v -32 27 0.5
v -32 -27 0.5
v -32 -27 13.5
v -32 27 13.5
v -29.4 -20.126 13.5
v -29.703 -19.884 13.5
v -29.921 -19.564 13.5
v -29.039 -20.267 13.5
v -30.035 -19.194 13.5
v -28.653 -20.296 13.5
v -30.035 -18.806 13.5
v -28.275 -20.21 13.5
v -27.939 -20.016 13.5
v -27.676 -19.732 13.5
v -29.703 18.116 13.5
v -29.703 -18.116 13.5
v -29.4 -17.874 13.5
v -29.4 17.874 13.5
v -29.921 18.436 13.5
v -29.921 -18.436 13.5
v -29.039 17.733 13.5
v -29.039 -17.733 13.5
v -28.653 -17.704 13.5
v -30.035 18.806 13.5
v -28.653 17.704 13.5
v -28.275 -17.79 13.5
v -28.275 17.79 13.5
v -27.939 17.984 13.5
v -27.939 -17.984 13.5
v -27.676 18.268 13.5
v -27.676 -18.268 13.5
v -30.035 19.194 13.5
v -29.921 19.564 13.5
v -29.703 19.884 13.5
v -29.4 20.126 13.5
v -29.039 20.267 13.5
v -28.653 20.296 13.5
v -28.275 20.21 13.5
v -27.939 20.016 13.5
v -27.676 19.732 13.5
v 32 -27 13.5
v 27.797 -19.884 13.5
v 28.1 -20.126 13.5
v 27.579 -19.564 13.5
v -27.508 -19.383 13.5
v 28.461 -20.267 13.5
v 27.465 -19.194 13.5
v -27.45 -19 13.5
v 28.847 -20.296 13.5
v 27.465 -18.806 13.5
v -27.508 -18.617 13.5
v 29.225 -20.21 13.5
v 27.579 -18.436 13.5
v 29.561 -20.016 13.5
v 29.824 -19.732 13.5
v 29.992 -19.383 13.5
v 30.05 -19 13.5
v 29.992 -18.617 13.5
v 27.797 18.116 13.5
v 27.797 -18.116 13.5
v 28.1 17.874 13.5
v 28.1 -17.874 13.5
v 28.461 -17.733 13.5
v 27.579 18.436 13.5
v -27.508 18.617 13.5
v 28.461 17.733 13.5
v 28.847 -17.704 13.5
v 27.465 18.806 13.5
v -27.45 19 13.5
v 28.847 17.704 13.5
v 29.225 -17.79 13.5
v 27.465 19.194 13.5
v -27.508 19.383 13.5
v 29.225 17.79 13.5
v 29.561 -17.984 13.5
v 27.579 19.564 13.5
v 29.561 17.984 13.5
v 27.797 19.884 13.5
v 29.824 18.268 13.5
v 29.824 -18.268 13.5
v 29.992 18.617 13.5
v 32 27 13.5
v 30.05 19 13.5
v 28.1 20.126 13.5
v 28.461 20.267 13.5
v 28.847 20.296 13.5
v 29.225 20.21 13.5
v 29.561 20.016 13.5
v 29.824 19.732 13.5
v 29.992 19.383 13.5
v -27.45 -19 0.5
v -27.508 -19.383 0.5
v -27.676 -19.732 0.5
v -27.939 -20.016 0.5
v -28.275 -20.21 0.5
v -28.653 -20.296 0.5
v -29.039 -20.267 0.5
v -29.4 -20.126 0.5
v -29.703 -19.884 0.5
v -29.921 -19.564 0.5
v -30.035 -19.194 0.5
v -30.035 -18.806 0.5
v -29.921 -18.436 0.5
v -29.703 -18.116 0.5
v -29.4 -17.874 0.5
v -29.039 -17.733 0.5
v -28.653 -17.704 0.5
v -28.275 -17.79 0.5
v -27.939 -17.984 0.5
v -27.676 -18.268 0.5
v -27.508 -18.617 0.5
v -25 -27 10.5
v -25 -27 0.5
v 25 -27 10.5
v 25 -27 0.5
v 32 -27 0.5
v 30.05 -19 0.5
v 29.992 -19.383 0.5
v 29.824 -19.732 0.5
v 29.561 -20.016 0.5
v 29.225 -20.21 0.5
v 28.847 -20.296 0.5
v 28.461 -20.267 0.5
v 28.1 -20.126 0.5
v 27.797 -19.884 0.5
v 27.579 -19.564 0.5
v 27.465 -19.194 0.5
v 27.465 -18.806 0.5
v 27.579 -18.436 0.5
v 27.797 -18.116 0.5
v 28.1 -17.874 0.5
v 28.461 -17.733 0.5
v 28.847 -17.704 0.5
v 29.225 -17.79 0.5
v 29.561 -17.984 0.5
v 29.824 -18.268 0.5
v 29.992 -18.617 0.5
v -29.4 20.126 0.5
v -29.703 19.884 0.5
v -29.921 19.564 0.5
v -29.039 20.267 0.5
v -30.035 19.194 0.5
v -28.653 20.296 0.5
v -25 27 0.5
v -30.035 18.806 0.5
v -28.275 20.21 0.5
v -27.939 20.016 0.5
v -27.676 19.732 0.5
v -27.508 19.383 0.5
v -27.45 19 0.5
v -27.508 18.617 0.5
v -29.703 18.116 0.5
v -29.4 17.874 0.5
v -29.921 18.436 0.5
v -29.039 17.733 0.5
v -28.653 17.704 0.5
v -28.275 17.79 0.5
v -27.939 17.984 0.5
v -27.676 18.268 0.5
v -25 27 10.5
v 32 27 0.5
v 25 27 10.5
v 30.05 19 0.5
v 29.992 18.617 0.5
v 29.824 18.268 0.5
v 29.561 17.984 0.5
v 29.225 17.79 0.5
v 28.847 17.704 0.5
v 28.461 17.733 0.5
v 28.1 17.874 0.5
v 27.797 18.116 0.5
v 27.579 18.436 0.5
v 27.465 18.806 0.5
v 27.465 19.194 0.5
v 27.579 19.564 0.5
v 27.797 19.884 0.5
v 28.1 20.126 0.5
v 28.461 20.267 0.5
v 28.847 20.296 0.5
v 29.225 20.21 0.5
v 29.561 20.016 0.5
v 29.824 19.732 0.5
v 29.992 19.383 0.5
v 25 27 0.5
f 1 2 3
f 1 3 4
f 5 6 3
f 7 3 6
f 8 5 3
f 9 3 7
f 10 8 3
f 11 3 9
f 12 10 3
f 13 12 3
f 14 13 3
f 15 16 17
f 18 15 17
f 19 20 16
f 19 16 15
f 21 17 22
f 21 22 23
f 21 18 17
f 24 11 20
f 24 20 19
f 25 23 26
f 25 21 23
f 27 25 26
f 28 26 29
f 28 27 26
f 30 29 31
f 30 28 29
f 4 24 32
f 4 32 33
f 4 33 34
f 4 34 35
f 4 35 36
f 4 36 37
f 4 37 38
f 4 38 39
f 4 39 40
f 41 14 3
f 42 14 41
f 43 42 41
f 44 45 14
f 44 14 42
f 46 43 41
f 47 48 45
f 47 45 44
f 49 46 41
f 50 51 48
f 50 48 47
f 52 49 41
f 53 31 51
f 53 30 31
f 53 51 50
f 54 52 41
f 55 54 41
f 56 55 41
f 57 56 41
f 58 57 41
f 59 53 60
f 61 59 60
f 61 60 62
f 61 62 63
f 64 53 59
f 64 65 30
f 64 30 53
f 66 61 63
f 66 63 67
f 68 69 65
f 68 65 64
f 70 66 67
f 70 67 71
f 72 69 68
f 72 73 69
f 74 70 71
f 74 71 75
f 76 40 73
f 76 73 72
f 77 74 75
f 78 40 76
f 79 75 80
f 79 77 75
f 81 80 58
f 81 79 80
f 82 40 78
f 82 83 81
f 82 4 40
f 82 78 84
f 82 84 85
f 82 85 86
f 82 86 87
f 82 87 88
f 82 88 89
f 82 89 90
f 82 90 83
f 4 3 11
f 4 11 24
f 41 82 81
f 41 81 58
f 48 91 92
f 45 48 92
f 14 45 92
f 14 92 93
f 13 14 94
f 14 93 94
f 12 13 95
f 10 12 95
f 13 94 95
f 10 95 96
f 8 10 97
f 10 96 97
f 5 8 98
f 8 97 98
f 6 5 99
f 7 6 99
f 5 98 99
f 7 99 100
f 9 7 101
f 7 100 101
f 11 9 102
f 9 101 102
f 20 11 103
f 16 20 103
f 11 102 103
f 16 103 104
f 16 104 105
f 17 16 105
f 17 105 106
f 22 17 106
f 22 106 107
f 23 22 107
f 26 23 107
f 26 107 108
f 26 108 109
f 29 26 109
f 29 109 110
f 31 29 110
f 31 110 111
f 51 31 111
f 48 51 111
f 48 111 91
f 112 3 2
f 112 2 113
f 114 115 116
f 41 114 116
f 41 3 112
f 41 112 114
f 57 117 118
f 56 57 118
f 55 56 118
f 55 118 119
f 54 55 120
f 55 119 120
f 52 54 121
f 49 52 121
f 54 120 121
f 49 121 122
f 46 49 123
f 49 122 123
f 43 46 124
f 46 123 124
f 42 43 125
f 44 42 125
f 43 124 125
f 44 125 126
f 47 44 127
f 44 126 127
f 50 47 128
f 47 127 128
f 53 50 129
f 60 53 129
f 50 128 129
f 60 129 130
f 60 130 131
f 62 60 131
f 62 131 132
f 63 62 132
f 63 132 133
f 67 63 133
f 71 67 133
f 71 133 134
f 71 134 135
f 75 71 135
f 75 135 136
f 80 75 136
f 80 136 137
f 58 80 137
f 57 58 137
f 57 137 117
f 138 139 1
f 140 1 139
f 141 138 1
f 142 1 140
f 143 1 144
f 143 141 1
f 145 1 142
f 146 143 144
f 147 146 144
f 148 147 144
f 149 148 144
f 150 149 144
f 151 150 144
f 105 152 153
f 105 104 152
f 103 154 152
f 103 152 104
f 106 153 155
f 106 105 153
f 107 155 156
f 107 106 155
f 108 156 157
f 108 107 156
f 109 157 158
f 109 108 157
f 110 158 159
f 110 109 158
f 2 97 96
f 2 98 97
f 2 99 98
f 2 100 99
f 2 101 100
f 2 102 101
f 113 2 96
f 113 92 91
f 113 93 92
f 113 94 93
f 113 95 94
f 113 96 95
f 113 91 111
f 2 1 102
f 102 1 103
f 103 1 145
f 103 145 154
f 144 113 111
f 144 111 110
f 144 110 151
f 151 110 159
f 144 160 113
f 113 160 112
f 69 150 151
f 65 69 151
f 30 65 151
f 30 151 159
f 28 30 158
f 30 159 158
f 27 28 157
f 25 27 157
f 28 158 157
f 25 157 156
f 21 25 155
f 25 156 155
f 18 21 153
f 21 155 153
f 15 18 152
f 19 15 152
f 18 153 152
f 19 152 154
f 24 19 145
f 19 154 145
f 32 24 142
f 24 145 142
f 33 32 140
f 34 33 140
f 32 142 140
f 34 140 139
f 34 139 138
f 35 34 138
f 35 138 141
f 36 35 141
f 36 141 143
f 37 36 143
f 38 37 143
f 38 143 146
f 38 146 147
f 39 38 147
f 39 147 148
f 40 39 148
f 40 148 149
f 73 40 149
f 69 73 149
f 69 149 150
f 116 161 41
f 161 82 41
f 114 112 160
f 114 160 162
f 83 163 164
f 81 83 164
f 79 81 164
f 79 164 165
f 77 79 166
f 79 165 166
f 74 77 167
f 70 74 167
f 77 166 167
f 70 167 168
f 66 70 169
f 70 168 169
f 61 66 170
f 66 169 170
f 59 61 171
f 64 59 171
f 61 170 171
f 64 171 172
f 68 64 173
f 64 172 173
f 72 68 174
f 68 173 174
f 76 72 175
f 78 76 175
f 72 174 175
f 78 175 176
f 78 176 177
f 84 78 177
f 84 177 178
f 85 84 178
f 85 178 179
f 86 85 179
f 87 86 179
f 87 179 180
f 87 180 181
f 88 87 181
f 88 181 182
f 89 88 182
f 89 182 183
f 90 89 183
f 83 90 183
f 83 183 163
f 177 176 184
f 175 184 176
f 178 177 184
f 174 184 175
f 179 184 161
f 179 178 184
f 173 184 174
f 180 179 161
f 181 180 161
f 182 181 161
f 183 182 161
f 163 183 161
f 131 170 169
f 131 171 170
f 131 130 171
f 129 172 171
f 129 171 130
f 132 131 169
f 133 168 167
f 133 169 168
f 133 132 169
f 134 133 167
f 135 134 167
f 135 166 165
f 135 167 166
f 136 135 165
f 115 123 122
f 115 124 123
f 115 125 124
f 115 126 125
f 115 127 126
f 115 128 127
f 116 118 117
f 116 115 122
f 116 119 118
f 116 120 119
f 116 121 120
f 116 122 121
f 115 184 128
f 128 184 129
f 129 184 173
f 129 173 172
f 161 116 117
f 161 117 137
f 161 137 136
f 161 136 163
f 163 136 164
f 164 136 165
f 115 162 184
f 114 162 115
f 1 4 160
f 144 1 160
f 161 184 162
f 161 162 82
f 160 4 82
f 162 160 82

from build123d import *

# Parameters (mm, degrees)
SKETCH_W        = 64
SKETCH_H        = 54
PAD_DEPTH       = 3
SKETCH001_W     = 7
SKETCH001_H     = 54
PAD001_DEPTH    = 10
SKETCH002_R     = 1.3
POCKET_DEPTH    = 20
SKETCH003_R     = 1.3
POCKET001_DEPTH = 20


with BuildPart() as part:
    # Sketch → Pad (new body)
    with BuildSketch(Plane.XY):
        Rectangle(SKETCH_W, SKETCH_H)
    extrude(amount=PAD_DEPTH)

    # Sketch001 (on Face5 of Pad) → Pad001 (join)
    with BuildSketch(Plane(origin=(0, 0, 0), x_dir=(1, 0, 0), z_dir=(0, 0, -1))):
        with Locations((28.5, 0)):
            Rectangle(SKETCH001_W, SKETCH001_H)
        with Locations((-28.5, 0)):
            Rectangle(SKETCH001_W, SKETCH001_H)
    extrude(amount=PAD001_DEPTH)

    # Sketch002 (on Face12 of Pad001) → Pocket (cut)
    with BuildSketch(Plane(origin=(0, 0, -10), x_dir=(1, 0, 0), z_dir=(0, 0, -1))):
        with Locations((-28.75, 19)):
            Circle(SKETCH002_R)
        with Locations((-28.75, -19)):
            Circle(SKETCH002_R)
    extrude(amount=-POCKET_DEPTH, mode=Mode.SUBTRACT)

    # Sketch003 (on Face14 of Pocket) → Pocket001 (cut)
    with BuildSketch(Plane(origin=(0, 0, -10), x_dir=(1, 0, 0), z_dir=(0, 0, -1))):
        with Locations((28.75, 19)):
            Circle(SKETCH003_R)
        with Locations((28.75, -19)):
            Circle(SKETCH003_R)
    extrude(amount=-POCKET001_DEPTH, mode=Mode.SUBTRACT)


with BuildPart() as part_1:
    # Body placement: moved
    add(part.part.moved(Location((0, 0, 10.5))))


solid = part_1.part
